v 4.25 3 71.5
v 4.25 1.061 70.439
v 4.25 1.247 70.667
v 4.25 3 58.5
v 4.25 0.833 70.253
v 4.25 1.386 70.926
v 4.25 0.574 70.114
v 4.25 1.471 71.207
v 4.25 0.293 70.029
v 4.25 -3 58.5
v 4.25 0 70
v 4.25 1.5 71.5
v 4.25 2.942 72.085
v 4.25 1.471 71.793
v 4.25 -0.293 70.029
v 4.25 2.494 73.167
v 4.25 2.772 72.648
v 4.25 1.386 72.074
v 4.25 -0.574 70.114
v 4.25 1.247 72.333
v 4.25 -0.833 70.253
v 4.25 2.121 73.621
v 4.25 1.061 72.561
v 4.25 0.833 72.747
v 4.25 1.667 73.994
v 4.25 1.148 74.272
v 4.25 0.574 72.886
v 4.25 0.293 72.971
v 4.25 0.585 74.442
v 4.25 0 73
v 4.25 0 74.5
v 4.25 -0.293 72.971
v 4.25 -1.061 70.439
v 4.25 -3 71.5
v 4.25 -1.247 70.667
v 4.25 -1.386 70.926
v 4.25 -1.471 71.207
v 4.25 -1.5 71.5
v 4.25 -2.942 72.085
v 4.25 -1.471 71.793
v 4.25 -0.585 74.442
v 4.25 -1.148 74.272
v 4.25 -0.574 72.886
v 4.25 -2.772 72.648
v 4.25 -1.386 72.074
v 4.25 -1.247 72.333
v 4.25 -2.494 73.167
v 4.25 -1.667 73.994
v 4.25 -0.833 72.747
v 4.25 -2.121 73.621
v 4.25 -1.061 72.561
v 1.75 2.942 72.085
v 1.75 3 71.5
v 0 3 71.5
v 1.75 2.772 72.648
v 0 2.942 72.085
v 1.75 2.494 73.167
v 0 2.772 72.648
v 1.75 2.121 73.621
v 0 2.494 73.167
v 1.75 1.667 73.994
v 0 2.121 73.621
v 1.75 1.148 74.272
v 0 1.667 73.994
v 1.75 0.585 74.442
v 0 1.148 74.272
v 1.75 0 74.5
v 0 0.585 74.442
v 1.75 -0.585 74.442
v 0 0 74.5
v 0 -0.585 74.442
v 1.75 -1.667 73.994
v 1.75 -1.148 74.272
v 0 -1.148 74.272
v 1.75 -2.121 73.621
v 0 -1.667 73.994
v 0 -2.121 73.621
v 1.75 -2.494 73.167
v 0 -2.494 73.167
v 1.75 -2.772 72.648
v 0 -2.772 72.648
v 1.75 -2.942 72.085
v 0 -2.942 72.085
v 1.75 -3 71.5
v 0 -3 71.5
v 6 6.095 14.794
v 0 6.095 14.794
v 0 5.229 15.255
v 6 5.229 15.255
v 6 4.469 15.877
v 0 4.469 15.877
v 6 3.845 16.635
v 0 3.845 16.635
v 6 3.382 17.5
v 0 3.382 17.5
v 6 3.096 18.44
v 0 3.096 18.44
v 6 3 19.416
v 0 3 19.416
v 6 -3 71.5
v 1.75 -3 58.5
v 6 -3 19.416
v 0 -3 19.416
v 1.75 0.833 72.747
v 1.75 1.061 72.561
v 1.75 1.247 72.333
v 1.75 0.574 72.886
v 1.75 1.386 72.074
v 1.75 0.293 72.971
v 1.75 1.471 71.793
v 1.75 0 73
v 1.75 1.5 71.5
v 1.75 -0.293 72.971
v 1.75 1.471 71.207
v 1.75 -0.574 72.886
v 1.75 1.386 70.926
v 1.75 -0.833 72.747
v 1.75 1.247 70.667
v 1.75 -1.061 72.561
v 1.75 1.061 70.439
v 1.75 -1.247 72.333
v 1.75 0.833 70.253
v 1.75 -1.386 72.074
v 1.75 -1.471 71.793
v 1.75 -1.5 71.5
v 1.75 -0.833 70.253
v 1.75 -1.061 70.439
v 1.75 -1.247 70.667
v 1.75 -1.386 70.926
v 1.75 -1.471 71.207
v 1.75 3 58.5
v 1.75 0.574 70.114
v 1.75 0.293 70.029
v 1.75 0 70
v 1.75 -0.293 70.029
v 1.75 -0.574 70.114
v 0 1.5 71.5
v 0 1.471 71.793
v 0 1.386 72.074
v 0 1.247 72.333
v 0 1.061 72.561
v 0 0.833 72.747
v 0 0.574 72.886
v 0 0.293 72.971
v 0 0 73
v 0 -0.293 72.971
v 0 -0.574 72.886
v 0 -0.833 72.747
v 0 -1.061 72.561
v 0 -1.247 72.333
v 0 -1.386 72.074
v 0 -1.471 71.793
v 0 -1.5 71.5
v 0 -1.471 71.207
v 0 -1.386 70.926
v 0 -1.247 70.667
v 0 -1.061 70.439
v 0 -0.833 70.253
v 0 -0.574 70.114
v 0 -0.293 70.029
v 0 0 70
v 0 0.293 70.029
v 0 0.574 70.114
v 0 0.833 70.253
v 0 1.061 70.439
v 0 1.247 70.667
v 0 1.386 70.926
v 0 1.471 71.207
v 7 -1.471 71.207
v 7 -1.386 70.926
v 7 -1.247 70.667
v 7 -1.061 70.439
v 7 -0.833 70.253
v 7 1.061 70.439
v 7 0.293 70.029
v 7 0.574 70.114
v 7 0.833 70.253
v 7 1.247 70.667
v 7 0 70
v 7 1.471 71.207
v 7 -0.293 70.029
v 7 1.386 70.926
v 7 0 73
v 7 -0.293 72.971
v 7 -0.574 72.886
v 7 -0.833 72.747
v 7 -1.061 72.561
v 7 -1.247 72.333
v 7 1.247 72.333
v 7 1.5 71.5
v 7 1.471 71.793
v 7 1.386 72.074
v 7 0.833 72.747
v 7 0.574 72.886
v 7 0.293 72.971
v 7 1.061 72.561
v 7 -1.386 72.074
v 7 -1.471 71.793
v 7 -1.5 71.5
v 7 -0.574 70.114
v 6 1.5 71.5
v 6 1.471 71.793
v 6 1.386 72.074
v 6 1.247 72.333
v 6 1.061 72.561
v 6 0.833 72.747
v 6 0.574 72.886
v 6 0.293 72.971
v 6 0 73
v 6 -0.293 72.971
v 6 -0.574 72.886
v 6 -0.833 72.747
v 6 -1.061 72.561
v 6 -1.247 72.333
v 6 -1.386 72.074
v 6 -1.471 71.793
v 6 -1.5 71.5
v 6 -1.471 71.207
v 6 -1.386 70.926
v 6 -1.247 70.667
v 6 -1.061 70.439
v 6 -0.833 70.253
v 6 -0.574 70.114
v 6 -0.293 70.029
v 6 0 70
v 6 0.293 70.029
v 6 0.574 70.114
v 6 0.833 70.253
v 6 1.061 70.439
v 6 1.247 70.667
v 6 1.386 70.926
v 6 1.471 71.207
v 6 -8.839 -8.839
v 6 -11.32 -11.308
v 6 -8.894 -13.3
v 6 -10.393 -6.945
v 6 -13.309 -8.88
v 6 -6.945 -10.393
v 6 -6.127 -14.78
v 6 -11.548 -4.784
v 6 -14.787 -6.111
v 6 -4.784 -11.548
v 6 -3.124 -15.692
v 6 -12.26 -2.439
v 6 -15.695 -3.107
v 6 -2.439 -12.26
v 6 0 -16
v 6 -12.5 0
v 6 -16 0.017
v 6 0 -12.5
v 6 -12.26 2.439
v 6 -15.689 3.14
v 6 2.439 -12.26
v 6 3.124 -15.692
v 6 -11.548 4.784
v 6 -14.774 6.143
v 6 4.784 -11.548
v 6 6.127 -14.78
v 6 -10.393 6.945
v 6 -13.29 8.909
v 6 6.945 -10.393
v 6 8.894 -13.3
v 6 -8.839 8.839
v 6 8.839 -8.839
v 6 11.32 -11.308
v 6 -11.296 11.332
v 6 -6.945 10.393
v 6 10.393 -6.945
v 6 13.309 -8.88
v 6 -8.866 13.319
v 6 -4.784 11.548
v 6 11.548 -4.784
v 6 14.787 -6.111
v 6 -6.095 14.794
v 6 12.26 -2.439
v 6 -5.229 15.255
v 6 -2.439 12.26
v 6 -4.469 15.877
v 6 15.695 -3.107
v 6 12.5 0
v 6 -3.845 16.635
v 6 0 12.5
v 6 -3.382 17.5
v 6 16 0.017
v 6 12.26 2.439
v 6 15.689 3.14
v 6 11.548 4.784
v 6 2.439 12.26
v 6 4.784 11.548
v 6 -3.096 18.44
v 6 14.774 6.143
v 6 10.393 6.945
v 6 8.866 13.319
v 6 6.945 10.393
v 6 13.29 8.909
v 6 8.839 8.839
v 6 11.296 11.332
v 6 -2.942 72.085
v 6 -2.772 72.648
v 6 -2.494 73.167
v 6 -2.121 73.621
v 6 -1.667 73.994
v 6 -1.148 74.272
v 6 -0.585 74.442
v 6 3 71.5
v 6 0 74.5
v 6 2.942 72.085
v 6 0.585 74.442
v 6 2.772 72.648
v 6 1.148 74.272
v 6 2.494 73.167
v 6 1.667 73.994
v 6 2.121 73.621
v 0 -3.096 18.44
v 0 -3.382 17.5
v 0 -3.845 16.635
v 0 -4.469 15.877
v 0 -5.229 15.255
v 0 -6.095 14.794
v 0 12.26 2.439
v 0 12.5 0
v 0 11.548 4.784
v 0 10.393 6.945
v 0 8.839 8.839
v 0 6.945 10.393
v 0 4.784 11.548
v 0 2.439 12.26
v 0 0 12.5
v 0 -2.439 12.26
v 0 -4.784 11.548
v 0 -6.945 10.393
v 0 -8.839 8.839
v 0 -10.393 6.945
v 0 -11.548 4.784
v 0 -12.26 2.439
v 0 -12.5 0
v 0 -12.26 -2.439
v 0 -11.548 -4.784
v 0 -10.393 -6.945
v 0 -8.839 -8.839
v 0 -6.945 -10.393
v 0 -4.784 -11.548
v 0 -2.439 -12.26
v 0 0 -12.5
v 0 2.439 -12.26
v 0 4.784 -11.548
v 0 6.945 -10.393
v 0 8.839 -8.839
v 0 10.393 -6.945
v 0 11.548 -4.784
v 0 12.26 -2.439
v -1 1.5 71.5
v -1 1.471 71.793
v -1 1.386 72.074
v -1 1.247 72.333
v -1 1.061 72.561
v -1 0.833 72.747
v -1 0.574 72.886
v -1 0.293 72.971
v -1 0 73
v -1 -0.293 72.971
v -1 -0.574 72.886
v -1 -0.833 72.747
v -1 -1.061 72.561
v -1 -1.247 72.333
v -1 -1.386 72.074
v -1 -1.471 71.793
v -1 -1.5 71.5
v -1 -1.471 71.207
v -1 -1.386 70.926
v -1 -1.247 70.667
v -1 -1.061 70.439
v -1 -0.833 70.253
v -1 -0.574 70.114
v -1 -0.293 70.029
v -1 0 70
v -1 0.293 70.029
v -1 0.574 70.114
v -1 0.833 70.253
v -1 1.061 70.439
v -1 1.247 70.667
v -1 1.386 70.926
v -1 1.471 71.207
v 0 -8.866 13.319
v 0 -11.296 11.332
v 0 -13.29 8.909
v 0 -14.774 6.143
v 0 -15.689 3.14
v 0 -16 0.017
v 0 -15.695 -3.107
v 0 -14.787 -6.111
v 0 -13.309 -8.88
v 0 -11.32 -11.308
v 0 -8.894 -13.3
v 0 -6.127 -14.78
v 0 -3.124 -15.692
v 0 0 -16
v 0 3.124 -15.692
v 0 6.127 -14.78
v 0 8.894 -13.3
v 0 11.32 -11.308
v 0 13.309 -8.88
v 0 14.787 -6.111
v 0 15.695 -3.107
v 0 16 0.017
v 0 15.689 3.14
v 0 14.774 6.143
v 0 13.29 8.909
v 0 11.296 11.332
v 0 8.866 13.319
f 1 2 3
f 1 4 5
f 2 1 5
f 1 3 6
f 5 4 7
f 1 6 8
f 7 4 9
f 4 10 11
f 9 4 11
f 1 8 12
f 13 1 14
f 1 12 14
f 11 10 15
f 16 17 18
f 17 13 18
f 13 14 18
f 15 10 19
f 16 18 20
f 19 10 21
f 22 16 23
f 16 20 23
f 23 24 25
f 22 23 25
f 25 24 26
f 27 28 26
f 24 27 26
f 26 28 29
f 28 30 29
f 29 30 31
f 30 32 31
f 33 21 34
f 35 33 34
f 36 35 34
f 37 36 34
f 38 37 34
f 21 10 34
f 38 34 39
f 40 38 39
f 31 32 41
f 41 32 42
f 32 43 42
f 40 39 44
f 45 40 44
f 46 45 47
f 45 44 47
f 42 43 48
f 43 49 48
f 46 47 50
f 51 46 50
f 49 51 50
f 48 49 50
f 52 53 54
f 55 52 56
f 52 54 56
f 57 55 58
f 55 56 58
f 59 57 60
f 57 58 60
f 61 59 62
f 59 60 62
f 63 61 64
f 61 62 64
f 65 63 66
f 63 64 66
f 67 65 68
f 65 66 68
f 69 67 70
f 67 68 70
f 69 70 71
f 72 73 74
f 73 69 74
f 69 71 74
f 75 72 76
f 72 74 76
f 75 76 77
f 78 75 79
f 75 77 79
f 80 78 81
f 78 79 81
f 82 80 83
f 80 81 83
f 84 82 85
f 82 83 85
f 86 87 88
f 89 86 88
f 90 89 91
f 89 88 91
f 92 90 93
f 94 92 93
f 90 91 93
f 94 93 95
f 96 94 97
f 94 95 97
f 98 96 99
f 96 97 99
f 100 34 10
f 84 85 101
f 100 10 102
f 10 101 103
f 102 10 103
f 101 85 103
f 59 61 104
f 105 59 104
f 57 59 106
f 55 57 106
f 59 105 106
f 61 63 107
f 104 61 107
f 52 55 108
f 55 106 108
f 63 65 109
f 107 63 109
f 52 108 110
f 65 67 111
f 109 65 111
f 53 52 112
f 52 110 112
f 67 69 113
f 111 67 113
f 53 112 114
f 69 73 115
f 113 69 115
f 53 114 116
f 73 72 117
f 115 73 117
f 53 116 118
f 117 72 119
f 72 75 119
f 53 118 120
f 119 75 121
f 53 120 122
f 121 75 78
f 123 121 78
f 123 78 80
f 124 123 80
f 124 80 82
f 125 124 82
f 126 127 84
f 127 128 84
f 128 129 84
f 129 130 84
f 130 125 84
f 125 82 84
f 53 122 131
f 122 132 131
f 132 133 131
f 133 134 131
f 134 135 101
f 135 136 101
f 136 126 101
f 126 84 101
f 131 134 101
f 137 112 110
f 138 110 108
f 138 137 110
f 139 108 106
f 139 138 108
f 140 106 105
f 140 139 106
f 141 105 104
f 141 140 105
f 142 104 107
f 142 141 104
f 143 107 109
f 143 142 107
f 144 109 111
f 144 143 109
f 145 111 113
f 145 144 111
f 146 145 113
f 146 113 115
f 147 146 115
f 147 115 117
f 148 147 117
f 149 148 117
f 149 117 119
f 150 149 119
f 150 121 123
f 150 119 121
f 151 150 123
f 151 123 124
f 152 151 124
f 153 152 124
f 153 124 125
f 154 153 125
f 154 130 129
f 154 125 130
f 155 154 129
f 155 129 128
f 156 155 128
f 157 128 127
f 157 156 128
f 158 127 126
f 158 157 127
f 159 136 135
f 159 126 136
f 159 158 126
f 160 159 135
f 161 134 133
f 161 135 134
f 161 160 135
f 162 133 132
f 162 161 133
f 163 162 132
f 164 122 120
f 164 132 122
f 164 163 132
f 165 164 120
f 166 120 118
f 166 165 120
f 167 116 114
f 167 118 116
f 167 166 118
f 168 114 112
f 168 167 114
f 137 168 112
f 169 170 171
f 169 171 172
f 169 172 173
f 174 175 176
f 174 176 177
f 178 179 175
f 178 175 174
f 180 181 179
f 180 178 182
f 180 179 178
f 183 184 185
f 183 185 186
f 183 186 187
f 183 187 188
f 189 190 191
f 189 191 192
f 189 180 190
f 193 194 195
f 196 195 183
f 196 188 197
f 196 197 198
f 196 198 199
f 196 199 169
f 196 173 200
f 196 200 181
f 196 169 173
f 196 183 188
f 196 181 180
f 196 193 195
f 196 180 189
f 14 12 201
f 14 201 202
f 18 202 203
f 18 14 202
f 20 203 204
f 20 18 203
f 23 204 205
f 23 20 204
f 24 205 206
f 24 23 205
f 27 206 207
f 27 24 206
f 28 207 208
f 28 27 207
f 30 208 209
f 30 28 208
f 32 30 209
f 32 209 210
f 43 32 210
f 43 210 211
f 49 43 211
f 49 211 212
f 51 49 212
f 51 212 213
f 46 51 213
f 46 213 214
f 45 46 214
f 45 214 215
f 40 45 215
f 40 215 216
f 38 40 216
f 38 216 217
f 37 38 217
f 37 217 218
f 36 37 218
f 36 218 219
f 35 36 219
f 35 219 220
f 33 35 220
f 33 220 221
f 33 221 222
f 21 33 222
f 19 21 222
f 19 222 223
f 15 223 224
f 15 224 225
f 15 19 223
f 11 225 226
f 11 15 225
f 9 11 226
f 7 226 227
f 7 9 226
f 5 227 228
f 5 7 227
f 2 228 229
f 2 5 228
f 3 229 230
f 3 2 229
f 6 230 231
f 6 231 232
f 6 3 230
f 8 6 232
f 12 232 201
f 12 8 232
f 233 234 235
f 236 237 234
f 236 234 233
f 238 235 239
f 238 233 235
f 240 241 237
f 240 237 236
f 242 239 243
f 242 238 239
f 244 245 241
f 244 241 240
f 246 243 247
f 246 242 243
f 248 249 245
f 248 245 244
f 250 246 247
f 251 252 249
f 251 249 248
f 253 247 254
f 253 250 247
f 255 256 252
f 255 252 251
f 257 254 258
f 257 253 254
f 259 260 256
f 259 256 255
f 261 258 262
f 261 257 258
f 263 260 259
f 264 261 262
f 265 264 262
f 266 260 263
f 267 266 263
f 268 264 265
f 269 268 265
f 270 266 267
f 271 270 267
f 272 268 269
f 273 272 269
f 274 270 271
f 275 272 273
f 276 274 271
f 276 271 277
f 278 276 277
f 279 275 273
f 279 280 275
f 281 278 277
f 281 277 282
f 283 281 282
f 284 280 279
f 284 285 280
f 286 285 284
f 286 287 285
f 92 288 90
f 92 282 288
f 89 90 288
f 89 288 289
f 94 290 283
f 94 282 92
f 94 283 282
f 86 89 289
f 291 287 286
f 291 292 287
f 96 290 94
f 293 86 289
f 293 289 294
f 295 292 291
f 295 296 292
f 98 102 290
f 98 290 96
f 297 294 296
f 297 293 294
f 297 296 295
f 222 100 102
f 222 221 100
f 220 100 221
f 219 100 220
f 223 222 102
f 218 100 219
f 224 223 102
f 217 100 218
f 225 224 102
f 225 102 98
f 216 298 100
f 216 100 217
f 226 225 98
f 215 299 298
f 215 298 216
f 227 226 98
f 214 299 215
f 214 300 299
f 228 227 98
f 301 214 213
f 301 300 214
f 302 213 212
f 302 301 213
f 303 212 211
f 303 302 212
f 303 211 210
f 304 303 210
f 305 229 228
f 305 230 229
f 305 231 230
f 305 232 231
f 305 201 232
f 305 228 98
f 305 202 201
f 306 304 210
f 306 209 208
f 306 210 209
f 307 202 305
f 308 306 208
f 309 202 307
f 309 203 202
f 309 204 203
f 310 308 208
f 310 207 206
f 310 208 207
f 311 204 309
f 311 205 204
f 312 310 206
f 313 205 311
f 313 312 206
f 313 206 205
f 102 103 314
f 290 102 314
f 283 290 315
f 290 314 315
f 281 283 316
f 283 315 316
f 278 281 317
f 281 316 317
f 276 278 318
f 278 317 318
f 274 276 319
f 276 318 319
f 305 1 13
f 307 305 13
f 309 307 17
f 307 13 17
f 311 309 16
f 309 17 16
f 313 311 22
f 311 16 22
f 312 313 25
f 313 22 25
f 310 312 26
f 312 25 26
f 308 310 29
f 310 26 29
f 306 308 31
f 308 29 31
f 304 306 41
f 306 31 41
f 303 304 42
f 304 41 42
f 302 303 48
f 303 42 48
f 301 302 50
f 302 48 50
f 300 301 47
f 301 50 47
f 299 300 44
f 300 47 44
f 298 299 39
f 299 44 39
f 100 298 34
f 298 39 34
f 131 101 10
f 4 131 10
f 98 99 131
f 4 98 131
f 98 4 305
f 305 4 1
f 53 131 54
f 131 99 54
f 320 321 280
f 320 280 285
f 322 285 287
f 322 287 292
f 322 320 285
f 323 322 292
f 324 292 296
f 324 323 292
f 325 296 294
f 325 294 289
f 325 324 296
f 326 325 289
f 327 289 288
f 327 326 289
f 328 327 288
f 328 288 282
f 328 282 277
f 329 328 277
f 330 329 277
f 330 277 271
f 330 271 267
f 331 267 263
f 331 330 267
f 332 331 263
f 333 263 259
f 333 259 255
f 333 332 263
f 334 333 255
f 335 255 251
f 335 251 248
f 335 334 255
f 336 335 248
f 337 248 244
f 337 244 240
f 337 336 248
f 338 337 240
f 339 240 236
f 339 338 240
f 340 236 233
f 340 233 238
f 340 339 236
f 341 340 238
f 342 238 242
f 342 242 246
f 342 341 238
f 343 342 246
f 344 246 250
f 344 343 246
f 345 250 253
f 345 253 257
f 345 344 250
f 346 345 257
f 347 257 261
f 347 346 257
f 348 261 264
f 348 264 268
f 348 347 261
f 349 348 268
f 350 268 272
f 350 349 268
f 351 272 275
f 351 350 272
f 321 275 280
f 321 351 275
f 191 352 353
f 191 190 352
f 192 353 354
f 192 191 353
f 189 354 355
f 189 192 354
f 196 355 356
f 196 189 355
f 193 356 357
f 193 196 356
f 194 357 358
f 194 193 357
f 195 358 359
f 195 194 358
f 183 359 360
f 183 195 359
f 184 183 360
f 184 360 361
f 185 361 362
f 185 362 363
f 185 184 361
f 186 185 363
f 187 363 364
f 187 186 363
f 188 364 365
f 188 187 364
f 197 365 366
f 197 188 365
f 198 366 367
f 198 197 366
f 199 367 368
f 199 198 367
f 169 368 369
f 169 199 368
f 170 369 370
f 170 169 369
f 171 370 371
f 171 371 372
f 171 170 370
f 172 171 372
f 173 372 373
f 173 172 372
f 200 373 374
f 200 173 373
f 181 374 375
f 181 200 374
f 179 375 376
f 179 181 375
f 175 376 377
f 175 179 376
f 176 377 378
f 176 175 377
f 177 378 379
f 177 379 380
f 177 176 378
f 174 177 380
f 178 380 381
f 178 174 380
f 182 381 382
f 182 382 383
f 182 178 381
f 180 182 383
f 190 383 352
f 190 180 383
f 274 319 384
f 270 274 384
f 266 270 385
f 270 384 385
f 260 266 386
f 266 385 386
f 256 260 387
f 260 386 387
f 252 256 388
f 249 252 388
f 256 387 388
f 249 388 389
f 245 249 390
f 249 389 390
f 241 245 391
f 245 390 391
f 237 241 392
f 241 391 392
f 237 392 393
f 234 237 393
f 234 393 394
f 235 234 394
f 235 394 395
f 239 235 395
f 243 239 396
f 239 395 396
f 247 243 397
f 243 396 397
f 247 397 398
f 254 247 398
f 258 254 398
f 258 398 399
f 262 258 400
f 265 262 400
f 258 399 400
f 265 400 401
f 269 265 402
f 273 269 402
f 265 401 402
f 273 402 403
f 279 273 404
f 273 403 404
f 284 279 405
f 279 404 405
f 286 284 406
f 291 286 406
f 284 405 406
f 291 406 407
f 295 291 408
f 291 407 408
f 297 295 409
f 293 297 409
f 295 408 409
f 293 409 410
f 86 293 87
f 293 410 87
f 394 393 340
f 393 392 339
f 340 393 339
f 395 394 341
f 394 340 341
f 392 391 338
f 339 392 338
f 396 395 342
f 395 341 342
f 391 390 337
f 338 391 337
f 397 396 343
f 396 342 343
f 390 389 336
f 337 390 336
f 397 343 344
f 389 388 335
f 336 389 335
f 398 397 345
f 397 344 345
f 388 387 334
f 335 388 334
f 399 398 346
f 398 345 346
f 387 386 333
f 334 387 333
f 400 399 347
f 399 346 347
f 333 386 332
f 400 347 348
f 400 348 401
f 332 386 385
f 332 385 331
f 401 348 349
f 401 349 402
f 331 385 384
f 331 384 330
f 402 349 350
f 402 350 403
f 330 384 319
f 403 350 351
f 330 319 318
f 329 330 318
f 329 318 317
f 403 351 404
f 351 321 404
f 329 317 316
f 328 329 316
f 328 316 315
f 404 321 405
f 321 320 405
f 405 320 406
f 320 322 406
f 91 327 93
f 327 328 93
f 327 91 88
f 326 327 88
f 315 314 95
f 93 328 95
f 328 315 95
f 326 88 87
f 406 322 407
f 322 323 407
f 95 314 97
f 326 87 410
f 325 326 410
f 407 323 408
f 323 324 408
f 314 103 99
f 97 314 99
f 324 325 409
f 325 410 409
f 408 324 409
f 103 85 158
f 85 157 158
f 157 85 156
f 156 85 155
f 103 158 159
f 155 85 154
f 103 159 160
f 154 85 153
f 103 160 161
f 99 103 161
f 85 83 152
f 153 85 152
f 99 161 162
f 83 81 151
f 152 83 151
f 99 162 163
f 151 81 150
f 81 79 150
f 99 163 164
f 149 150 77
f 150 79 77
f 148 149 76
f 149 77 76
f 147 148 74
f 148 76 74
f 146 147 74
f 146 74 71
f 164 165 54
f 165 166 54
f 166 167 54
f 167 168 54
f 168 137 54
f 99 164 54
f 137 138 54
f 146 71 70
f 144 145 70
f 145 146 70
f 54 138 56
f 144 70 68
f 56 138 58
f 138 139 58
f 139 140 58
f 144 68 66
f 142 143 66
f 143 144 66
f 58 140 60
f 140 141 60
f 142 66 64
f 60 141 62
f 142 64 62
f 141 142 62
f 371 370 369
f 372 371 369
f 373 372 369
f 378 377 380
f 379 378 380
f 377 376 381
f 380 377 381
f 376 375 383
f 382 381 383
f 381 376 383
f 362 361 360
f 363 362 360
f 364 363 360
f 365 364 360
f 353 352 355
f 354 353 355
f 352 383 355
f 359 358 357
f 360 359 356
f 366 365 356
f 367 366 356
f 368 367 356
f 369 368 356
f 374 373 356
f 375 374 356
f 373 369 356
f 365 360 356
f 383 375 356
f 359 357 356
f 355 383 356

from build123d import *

# Parameters (mm, degrees)
F0_R          = 12.5
F0_R_2        = 1.5
F1_DEPTH      = 6
F2_W          = 2.5
F2_H          = 6
F2_H_2        = 13
F3_DEPTH      = 19.001
F4_R          = 1.5
F5_DEPTH      = 1
F5_DEPTH_BACK = 7


with BuildPart() as f1:
    # F0 (on Right) → F1 (new body)
    with BuildSketch(Plane.YZ):
        with BuildLine():
            ThreePointArc((-3, 19.416488), (-3.845255, 16.634745), (-6.095238, 14.793515))
            ThreePointArc((-6.095238, 14.793515), (0, -16), (6.095238, 14.793515))
            ThreePointArc((6.095238, 14.793515), (3.845255, 16.634745), (3, 19.416488))
            Line((3, 19.416488), (3, 71.5))
            ThreePointArc((3, 71.5), (0, 74.5), (-3, 71.5))
            Line((-3, 71.5), (-3, 19.416488))
        make_face()
        Circle(F0_R, mode=Mode.SUBTRACT)
        with Locations((0, 71.5)):
            Circle(F0_R_2, mode=Mode.SUBTRACT)
    extrude(amount=F1_DEPTH)

    # F2 (on face) → F3 (cut, through all)
    with BuildSketch(Plane.XZ.offset(3)):
        with Locations((3, 74.5)):
            Rectangle(F2_W, F2_H)
        with Locations((3, 65)):
            Rectangle(F2_W, F2_H_2)
    extrude(amount=-F3_DEPTH, mode=Mode.SUBTRACT)


with BuildPart() as f5:
    # F4 (on face) → F5 (new body, two sides)
    with BuildSketch(Plane.YZ.offset(6)) as f5_sk:
        with Locations((0, 71.5)):
            Circle(F4_R)
    extrude(amount=F5_DEPTH)
    extrude(f5_sk.sketch, amount=-F5_DEPTH_BACK)


solid = Compound([f1.part, f5.part])
